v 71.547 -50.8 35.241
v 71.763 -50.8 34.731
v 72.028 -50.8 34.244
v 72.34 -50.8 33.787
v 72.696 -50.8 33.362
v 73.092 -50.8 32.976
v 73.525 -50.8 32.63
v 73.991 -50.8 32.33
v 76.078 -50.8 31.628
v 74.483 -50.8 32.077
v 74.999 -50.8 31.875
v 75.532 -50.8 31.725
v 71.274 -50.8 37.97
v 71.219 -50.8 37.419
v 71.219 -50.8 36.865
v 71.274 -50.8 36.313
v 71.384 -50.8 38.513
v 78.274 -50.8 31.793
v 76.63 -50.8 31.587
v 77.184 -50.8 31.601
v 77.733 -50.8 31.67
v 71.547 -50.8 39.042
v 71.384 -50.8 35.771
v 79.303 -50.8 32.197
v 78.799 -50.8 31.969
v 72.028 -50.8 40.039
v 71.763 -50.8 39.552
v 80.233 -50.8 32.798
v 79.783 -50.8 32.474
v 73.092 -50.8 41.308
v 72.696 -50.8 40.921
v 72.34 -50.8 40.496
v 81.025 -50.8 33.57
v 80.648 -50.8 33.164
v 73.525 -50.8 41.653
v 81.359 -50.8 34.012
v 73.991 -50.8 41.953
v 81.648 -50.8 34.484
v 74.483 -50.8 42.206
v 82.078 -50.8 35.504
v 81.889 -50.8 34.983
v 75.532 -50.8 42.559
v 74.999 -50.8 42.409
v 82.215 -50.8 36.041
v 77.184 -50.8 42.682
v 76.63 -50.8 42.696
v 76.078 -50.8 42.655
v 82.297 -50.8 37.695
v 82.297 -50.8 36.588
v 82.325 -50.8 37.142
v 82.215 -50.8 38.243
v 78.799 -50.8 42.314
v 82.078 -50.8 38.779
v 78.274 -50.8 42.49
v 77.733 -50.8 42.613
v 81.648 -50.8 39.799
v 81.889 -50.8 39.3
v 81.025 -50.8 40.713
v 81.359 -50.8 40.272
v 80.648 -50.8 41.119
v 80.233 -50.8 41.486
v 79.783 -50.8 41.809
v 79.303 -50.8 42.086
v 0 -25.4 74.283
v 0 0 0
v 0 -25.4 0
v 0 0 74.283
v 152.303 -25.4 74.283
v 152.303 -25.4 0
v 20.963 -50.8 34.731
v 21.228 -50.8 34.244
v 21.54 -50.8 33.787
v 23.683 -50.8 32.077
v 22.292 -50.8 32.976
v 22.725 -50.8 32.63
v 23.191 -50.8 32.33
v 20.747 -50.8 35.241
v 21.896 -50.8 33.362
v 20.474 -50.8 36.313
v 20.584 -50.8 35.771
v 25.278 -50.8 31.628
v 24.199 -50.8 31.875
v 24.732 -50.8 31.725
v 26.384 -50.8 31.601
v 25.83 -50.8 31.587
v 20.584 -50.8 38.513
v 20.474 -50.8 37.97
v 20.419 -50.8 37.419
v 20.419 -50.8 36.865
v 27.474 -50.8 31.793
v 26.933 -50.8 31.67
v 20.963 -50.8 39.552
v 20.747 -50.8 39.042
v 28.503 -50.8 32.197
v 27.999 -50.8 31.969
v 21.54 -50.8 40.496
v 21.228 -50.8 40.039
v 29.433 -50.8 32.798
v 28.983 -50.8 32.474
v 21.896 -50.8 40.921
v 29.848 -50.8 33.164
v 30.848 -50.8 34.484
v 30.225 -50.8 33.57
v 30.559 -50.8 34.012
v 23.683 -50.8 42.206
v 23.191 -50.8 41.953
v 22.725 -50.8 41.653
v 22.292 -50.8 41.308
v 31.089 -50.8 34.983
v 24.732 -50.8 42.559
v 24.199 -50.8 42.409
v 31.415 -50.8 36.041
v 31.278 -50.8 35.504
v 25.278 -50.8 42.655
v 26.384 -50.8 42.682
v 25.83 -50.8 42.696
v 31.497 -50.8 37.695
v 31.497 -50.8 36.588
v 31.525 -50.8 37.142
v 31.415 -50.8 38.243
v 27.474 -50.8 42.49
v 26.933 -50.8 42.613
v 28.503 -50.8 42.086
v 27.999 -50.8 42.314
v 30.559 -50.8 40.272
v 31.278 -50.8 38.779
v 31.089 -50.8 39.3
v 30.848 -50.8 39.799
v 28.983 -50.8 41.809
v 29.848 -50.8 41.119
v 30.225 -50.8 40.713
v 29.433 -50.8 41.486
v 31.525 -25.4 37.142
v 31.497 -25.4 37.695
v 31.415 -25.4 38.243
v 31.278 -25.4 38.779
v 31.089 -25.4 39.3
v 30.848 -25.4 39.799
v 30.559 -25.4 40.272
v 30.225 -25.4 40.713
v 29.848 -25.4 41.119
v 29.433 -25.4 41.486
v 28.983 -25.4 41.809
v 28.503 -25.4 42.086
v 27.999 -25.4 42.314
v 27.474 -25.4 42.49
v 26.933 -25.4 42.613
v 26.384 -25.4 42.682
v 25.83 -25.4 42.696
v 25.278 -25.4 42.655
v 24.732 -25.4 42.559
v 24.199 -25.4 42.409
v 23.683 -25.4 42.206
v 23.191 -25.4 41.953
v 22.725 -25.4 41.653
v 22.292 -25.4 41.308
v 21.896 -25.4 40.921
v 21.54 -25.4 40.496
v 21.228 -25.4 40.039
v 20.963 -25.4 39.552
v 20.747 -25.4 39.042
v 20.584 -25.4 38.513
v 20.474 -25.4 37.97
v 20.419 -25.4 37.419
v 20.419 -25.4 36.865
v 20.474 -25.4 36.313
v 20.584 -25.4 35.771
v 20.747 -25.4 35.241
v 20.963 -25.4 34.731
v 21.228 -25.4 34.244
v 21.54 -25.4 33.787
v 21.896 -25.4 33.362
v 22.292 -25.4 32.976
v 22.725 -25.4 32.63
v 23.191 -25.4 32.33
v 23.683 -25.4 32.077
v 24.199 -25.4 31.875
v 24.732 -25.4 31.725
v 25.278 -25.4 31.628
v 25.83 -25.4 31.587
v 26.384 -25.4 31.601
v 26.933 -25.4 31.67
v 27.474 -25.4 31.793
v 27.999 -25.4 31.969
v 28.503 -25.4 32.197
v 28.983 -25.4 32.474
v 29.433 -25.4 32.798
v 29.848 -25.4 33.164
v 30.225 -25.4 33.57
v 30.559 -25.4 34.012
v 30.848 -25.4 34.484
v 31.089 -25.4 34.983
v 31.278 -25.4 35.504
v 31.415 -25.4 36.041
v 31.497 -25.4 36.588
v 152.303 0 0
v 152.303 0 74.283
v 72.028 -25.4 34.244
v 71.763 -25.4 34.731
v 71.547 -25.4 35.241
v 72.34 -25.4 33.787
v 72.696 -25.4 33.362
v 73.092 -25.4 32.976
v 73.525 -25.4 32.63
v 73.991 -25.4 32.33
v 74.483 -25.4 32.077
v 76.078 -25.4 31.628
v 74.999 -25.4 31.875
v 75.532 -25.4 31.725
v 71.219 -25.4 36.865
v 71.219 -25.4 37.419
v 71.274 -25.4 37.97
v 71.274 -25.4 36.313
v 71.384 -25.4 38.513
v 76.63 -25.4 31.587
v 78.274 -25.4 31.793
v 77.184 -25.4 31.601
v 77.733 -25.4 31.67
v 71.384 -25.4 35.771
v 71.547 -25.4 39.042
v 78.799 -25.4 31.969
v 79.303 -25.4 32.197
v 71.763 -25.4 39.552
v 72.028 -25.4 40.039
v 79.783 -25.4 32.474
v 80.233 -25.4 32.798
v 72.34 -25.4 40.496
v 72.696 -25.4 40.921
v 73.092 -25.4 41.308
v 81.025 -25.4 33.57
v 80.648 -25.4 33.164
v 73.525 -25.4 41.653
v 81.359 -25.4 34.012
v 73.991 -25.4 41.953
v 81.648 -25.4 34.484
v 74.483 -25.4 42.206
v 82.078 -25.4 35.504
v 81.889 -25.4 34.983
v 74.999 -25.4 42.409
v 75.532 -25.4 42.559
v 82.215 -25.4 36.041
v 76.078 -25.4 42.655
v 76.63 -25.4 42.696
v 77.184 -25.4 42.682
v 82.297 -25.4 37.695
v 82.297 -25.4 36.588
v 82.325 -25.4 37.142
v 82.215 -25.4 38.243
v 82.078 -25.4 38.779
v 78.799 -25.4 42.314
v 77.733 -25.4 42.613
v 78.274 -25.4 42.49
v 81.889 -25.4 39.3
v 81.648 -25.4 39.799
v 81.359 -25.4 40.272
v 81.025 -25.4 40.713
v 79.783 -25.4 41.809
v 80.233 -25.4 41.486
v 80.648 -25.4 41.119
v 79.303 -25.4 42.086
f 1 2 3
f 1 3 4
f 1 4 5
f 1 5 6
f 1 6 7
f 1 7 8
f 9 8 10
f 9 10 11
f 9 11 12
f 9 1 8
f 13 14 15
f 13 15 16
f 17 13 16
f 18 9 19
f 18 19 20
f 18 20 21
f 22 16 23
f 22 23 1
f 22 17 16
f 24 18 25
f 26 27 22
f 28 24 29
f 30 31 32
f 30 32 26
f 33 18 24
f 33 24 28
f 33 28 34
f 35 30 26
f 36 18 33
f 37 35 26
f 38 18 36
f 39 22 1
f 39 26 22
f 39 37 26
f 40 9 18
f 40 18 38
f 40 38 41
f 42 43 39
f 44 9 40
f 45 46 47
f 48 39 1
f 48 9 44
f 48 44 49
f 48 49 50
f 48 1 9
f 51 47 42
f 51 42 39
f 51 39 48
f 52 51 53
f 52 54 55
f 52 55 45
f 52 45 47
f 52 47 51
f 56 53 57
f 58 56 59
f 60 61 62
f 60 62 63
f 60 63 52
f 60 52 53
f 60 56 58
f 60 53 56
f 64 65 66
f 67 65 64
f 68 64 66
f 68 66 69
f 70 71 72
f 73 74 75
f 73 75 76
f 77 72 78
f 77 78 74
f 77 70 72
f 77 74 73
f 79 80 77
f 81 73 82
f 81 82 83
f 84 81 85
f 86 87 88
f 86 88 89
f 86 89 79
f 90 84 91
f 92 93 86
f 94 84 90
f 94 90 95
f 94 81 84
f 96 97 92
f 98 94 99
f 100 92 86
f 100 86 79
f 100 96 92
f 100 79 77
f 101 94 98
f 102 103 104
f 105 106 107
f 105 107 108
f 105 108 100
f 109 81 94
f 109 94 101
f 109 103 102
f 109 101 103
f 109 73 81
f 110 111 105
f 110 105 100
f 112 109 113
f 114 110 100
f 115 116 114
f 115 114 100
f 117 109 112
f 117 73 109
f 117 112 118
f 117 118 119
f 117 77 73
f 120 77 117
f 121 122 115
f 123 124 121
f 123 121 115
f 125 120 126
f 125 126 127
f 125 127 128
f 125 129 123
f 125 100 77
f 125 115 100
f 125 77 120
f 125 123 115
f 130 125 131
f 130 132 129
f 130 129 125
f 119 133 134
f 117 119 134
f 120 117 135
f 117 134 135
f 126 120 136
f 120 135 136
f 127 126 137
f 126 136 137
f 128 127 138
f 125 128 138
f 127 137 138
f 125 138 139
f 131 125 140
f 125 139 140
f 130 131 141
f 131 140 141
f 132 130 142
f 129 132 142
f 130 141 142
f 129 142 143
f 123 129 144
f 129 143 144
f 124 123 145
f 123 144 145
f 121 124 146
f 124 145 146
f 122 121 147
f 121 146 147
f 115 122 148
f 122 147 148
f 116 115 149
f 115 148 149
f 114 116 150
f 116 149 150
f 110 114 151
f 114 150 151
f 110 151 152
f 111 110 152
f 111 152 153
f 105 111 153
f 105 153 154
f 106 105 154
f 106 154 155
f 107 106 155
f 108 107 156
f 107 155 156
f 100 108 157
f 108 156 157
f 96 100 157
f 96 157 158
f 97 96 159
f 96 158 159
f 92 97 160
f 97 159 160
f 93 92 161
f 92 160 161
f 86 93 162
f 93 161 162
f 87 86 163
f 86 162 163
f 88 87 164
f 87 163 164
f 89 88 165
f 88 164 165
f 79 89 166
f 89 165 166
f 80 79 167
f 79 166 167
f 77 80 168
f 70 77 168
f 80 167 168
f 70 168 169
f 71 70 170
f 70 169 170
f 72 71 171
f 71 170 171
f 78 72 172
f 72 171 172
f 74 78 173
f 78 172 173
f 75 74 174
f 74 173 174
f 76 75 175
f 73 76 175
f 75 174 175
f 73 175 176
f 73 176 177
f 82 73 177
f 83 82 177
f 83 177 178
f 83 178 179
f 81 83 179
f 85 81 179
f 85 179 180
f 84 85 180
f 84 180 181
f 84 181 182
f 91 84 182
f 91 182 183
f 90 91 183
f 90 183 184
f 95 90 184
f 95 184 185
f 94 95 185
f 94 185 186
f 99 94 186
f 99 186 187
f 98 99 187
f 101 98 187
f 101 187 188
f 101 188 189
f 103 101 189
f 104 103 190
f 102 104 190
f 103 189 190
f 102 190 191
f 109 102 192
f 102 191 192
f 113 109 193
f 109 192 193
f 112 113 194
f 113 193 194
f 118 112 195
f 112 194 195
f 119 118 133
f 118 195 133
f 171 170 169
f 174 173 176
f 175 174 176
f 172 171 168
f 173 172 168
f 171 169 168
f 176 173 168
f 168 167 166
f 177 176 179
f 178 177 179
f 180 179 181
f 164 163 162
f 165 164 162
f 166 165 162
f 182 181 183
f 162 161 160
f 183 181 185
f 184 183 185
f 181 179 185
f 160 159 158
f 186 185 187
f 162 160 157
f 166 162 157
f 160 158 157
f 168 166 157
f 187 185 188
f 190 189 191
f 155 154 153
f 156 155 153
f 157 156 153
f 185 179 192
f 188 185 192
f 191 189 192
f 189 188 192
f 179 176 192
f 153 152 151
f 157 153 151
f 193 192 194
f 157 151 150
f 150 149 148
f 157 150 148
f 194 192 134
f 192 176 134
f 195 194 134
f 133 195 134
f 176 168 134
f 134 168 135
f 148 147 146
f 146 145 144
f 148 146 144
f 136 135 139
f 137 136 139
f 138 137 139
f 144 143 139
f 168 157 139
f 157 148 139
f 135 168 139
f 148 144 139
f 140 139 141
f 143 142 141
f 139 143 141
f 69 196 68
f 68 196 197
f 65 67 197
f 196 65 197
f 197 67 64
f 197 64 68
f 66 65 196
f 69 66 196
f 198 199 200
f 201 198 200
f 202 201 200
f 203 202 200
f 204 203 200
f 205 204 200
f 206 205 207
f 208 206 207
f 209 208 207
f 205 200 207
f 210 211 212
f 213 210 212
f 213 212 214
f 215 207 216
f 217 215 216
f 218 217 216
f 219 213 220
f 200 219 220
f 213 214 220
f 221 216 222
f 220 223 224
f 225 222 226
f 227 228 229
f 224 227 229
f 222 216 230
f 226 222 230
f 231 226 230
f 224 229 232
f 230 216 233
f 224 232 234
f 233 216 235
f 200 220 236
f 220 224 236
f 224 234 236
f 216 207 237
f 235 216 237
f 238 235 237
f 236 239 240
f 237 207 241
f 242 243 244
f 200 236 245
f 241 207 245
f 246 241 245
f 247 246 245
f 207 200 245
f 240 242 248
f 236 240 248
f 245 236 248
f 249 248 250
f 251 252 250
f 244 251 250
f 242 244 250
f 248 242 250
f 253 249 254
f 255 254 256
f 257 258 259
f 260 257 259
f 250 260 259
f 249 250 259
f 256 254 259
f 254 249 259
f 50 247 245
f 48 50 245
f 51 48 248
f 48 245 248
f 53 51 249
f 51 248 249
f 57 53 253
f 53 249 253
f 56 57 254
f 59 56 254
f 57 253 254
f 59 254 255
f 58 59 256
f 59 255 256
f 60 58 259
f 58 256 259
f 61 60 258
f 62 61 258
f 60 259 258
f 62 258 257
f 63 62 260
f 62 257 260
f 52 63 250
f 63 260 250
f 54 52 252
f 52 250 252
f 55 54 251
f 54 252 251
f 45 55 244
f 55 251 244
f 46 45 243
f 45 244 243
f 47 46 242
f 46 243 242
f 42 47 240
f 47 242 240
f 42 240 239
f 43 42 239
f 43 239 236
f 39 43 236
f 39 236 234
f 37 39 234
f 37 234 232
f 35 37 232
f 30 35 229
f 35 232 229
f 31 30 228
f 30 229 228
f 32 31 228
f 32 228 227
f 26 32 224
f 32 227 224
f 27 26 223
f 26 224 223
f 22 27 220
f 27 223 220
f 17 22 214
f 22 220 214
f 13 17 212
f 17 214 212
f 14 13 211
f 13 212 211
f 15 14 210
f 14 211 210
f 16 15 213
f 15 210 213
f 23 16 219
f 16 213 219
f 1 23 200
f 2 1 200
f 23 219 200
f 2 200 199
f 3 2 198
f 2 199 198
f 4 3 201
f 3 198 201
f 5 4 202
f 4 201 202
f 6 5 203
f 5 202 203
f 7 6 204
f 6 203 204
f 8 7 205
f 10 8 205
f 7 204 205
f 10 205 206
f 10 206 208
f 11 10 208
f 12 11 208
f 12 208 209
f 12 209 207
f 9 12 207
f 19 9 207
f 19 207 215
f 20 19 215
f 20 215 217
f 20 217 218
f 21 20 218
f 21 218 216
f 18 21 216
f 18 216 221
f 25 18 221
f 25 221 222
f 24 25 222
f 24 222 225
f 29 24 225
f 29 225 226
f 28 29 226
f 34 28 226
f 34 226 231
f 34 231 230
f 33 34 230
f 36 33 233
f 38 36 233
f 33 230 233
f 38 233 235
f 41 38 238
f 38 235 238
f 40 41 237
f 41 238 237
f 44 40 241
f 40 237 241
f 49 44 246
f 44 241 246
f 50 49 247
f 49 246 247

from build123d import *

# Parameters (mm, degrees)
F0_W     = 152.302712
F0_H     = 74.283205
F1_DEPTH = 25.4
F2_R     = 5.55625
F3_DEPTH = 25.4


with BuildPart() as f1:
    # F0 (on Front) → F1 (new body)
    with BuildSketch(Plane.XZ):
        with Locations((76.151356, 37.141602)):
            Rectangle(F0_W, F0_H)
    extrude(amount=F1_DEPTH)


with BuildPart() as f3:
    # F2 (on face) → F3 (new body)
    with BuildSketch(Plane.XZ.offset(25.4)):
        with Locations((25.968658, 37.141602)):
            Circle(F2_R)
        with Locations((76.768658, 37.141602)):
            Circle(F2_R)
    extrude(amount=F3_DEPTH)


solid = Compound([f1.part, f3.part])
